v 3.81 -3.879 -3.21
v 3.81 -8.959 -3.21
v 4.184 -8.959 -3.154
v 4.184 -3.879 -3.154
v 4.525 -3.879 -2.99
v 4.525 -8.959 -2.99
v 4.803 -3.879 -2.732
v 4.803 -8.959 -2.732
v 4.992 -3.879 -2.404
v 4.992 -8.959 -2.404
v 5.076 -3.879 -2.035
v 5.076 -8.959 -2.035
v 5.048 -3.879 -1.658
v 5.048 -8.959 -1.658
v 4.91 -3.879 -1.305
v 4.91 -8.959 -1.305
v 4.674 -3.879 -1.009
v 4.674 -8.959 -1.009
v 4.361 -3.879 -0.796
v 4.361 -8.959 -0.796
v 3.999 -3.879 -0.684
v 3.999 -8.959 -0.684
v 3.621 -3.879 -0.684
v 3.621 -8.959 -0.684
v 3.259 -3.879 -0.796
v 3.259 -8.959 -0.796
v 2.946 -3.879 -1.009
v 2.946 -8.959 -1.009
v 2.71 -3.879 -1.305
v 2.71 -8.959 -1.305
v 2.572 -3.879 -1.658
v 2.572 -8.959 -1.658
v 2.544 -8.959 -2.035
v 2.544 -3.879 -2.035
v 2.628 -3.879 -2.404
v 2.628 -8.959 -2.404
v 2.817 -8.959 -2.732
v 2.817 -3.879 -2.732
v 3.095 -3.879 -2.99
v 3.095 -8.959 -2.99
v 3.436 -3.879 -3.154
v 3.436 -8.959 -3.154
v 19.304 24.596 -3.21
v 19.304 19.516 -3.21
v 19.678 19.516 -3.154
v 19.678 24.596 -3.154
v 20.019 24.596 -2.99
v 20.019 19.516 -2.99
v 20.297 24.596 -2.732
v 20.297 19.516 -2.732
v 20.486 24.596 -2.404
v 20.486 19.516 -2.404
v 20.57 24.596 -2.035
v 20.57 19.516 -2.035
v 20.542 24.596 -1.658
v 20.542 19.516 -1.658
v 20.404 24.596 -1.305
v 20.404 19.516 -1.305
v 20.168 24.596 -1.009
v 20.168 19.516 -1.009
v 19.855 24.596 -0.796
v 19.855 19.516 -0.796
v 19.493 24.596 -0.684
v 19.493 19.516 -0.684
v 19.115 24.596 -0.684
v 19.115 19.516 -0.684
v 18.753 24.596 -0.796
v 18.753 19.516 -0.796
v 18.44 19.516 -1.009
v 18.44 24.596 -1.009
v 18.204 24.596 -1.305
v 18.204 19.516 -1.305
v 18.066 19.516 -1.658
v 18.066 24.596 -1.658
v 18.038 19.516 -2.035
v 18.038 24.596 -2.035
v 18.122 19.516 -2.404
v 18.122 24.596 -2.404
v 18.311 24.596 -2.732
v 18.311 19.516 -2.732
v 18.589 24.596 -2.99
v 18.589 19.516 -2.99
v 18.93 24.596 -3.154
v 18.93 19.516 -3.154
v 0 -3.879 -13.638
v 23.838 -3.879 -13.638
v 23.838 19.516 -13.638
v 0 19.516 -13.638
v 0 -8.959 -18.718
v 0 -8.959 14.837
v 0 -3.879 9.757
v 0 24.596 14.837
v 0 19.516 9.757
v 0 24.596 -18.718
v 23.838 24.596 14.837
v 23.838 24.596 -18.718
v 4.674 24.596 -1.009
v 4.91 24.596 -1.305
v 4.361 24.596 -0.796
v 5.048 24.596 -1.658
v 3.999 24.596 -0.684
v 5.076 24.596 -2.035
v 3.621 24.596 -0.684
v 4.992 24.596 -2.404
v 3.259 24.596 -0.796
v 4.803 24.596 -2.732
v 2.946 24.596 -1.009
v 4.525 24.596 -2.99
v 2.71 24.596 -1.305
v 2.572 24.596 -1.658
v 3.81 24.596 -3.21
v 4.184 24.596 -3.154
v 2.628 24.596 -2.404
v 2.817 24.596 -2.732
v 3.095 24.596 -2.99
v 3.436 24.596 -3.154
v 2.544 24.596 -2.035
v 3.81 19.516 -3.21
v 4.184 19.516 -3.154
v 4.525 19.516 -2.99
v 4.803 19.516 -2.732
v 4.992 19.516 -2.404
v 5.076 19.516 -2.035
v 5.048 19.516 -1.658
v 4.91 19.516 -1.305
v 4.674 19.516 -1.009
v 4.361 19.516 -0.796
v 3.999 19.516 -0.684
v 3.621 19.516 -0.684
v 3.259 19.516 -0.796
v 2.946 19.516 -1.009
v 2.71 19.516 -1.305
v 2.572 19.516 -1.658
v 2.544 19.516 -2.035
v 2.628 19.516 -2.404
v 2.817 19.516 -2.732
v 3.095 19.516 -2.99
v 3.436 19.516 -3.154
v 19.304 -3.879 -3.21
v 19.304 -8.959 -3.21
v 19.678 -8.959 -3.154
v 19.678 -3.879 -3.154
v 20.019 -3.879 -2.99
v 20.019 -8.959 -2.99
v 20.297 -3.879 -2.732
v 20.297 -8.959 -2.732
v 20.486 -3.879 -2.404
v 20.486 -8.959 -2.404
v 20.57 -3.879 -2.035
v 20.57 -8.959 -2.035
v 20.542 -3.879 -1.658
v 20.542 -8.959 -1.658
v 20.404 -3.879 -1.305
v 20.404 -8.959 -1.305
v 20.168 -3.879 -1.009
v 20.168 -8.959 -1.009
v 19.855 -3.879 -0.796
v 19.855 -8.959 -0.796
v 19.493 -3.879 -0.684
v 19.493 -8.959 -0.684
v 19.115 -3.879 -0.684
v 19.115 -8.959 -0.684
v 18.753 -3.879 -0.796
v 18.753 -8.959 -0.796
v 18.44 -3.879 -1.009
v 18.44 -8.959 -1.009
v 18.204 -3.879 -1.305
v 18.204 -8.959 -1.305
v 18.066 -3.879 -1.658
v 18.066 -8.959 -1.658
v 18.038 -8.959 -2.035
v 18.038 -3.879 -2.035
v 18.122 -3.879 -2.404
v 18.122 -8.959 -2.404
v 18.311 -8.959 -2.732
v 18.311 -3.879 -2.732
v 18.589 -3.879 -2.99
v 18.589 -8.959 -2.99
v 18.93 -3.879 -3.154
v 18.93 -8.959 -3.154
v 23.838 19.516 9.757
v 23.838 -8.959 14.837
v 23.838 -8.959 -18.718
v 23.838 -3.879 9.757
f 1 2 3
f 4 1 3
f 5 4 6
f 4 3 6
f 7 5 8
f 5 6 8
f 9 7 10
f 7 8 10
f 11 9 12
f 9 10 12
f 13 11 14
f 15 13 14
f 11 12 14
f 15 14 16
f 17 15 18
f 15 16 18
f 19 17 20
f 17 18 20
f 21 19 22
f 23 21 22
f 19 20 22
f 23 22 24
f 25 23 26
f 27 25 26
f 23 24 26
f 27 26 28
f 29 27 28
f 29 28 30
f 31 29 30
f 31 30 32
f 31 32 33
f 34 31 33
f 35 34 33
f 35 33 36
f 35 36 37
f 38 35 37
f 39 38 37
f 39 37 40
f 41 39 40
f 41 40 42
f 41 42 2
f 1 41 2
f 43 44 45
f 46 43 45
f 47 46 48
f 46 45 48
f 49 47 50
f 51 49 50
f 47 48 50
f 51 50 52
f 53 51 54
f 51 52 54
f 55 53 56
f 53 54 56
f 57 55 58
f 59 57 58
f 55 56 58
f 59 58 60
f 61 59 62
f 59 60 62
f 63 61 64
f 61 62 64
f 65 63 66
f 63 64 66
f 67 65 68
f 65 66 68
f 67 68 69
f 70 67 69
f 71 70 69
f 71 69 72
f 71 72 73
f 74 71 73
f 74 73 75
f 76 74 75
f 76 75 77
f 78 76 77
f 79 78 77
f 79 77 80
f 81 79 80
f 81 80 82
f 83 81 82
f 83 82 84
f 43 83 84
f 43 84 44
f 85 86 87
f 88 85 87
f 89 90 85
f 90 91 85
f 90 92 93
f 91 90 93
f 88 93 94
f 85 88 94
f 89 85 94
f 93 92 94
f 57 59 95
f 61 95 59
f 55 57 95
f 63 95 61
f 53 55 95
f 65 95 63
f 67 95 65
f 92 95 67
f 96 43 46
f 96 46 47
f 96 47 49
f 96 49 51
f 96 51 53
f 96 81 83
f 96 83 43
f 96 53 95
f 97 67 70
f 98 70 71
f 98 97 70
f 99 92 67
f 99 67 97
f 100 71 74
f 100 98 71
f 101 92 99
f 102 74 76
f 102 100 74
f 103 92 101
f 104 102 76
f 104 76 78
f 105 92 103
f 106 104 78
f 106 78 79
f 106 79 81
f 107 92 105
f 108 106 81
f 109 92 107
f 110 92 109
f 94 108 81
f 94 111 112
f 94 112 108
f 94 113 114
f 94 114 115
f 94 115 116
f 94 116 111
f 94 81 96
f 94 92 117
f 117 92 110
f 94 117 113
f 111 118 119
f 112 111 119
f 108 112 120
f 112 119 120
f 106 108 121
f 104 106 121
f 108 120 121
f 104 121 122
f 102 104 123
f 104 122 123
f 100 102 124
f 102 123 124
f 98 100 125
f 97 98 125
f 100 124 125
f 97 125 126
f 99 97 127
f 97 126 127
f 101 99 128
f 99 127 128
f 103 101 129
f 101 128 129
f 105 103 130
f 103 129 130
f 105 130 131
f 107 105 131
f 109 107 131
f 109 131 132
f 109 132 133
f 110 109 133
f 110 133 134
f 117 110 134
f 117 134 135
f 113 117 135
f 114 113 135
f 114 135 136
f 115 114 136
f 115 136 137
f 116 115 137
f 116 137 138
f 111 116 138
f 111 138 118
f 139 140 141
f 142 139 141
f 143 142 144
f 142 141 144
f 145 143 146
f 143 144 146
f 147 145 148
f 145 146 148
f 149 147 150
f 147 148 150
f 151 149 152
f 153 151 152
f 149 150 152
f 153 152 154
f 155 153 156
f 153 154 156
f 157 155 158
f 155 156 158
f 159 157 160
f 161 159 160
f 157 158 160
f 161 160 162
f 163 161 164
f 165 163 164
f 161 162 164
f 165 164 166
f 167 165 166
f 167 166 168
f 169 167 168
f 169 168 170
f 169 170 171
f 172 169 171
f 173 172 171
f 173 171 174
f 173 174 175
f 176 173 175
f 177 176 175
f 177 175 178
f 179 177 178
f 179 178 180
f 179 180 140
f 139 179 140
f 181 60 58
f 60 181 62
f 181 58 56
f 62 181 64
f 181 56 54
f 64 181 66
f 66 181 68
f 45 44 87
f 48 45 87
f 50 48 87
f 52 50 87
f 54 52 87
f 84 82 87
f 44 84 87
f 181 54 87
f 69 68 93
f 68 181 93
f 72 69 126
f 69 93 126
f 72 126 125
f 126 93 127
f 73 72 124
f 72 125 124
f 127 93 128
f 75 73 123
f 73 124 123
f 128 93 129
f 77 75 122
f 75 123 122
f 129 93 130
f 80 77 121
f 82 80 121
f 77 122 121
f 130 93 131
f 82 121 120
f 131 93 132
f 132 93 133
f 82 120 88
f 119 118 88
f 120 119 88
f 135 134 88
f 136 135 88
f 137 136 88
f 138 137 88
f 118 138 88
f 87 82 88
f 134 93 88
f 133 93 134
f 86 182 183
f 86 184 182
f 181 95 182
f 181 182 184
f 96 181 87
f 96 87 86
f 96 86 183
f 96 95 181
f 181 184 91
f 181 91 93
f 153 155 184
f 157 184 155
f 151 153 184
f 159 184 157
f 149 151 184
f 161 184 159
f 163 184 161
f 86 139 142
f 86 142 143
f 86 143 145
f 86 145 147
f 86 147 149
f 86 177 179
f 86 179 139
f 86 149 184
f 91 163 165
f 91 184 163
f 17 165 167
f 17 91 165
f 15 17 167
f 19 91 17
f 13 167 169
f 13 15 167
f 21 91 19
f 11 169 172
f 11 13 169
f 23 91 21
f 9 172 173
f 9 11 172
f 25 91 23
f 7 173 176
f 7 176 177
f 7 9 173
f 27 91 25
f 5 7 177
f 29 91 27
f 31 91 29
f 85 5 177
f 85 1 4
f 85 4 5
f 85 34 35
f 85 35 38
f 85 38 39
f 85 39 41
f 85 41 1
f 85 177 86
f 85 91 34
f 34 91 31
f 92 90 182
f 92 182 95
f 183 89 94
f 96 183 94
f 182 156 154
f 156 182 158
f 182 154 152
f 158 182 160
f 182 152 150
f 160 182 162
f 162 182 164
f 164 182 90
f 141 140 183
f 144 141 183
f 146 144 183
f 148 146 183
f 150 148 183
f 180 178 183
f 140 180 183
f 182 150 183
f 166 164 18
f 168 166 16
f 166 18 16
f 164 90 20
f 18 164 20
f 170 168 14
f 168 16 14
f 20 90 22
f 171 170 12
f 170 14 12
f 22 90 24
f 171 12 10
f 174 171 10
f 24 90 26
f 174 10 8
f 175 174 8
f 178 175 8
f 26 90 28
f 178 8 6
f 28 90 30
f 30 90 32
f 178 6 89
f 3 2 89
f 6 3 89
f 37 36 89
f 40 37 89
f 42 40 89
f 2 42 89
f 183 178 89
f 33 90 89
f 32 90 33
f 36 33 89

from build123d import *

# Parameters (mm, degrees)
SKETCH1_W           = 33.554975054
SKETCH1_H           = 33.554975054
SKETCH1_W_2         = 23.394975054
SKETCH1_H_2         = 23.394975054
BOSS_EXTRUDE1_DEPTH = 23.837801194
SKETCH2_R           = 1.27
CUT_EXTRUDE1_DEPTH  = 46.216489821


with BuildPart() as part:
    # Sketch1 → Boss-Extrude1 (new body)
    with BuildSketch(Plane(origin=(0, 0, 0), x_dir=(0, 0, -1), z_dir=(1, 0, 0))):
        with Locations((1.94025366, 7.818080922)):
            Rectangle(SKETCH1_W, SKETCH1_H)
        with Locations((1.94025366, 7.818080922)):
            Rectangle(SKETCH1_W_2, SKETCH1_H_2, mode=Mode.SUBTRACT)
    extrude(amount=BOSS_EXTRUDE1_DEPTH)

    # Sketch2 → Cut-Extrude1 (cut, through all)
    with BuildSketch(Plane.XZ.offset(8.959406605)):
        with Locations(Location((3.81, -1.94025366, 0), (0, 0, 270))):
            Circle(SKETCH2_R)
        with Locations(Location((19.304, -1.94025366, 0), (0, 0, 270))):
            Circle(SKETCH2_R)
    extrude(amount=-CUT_EXTRUDE1_DEPTH, mode=Mode.SUBTRACT)


solid = part.part
